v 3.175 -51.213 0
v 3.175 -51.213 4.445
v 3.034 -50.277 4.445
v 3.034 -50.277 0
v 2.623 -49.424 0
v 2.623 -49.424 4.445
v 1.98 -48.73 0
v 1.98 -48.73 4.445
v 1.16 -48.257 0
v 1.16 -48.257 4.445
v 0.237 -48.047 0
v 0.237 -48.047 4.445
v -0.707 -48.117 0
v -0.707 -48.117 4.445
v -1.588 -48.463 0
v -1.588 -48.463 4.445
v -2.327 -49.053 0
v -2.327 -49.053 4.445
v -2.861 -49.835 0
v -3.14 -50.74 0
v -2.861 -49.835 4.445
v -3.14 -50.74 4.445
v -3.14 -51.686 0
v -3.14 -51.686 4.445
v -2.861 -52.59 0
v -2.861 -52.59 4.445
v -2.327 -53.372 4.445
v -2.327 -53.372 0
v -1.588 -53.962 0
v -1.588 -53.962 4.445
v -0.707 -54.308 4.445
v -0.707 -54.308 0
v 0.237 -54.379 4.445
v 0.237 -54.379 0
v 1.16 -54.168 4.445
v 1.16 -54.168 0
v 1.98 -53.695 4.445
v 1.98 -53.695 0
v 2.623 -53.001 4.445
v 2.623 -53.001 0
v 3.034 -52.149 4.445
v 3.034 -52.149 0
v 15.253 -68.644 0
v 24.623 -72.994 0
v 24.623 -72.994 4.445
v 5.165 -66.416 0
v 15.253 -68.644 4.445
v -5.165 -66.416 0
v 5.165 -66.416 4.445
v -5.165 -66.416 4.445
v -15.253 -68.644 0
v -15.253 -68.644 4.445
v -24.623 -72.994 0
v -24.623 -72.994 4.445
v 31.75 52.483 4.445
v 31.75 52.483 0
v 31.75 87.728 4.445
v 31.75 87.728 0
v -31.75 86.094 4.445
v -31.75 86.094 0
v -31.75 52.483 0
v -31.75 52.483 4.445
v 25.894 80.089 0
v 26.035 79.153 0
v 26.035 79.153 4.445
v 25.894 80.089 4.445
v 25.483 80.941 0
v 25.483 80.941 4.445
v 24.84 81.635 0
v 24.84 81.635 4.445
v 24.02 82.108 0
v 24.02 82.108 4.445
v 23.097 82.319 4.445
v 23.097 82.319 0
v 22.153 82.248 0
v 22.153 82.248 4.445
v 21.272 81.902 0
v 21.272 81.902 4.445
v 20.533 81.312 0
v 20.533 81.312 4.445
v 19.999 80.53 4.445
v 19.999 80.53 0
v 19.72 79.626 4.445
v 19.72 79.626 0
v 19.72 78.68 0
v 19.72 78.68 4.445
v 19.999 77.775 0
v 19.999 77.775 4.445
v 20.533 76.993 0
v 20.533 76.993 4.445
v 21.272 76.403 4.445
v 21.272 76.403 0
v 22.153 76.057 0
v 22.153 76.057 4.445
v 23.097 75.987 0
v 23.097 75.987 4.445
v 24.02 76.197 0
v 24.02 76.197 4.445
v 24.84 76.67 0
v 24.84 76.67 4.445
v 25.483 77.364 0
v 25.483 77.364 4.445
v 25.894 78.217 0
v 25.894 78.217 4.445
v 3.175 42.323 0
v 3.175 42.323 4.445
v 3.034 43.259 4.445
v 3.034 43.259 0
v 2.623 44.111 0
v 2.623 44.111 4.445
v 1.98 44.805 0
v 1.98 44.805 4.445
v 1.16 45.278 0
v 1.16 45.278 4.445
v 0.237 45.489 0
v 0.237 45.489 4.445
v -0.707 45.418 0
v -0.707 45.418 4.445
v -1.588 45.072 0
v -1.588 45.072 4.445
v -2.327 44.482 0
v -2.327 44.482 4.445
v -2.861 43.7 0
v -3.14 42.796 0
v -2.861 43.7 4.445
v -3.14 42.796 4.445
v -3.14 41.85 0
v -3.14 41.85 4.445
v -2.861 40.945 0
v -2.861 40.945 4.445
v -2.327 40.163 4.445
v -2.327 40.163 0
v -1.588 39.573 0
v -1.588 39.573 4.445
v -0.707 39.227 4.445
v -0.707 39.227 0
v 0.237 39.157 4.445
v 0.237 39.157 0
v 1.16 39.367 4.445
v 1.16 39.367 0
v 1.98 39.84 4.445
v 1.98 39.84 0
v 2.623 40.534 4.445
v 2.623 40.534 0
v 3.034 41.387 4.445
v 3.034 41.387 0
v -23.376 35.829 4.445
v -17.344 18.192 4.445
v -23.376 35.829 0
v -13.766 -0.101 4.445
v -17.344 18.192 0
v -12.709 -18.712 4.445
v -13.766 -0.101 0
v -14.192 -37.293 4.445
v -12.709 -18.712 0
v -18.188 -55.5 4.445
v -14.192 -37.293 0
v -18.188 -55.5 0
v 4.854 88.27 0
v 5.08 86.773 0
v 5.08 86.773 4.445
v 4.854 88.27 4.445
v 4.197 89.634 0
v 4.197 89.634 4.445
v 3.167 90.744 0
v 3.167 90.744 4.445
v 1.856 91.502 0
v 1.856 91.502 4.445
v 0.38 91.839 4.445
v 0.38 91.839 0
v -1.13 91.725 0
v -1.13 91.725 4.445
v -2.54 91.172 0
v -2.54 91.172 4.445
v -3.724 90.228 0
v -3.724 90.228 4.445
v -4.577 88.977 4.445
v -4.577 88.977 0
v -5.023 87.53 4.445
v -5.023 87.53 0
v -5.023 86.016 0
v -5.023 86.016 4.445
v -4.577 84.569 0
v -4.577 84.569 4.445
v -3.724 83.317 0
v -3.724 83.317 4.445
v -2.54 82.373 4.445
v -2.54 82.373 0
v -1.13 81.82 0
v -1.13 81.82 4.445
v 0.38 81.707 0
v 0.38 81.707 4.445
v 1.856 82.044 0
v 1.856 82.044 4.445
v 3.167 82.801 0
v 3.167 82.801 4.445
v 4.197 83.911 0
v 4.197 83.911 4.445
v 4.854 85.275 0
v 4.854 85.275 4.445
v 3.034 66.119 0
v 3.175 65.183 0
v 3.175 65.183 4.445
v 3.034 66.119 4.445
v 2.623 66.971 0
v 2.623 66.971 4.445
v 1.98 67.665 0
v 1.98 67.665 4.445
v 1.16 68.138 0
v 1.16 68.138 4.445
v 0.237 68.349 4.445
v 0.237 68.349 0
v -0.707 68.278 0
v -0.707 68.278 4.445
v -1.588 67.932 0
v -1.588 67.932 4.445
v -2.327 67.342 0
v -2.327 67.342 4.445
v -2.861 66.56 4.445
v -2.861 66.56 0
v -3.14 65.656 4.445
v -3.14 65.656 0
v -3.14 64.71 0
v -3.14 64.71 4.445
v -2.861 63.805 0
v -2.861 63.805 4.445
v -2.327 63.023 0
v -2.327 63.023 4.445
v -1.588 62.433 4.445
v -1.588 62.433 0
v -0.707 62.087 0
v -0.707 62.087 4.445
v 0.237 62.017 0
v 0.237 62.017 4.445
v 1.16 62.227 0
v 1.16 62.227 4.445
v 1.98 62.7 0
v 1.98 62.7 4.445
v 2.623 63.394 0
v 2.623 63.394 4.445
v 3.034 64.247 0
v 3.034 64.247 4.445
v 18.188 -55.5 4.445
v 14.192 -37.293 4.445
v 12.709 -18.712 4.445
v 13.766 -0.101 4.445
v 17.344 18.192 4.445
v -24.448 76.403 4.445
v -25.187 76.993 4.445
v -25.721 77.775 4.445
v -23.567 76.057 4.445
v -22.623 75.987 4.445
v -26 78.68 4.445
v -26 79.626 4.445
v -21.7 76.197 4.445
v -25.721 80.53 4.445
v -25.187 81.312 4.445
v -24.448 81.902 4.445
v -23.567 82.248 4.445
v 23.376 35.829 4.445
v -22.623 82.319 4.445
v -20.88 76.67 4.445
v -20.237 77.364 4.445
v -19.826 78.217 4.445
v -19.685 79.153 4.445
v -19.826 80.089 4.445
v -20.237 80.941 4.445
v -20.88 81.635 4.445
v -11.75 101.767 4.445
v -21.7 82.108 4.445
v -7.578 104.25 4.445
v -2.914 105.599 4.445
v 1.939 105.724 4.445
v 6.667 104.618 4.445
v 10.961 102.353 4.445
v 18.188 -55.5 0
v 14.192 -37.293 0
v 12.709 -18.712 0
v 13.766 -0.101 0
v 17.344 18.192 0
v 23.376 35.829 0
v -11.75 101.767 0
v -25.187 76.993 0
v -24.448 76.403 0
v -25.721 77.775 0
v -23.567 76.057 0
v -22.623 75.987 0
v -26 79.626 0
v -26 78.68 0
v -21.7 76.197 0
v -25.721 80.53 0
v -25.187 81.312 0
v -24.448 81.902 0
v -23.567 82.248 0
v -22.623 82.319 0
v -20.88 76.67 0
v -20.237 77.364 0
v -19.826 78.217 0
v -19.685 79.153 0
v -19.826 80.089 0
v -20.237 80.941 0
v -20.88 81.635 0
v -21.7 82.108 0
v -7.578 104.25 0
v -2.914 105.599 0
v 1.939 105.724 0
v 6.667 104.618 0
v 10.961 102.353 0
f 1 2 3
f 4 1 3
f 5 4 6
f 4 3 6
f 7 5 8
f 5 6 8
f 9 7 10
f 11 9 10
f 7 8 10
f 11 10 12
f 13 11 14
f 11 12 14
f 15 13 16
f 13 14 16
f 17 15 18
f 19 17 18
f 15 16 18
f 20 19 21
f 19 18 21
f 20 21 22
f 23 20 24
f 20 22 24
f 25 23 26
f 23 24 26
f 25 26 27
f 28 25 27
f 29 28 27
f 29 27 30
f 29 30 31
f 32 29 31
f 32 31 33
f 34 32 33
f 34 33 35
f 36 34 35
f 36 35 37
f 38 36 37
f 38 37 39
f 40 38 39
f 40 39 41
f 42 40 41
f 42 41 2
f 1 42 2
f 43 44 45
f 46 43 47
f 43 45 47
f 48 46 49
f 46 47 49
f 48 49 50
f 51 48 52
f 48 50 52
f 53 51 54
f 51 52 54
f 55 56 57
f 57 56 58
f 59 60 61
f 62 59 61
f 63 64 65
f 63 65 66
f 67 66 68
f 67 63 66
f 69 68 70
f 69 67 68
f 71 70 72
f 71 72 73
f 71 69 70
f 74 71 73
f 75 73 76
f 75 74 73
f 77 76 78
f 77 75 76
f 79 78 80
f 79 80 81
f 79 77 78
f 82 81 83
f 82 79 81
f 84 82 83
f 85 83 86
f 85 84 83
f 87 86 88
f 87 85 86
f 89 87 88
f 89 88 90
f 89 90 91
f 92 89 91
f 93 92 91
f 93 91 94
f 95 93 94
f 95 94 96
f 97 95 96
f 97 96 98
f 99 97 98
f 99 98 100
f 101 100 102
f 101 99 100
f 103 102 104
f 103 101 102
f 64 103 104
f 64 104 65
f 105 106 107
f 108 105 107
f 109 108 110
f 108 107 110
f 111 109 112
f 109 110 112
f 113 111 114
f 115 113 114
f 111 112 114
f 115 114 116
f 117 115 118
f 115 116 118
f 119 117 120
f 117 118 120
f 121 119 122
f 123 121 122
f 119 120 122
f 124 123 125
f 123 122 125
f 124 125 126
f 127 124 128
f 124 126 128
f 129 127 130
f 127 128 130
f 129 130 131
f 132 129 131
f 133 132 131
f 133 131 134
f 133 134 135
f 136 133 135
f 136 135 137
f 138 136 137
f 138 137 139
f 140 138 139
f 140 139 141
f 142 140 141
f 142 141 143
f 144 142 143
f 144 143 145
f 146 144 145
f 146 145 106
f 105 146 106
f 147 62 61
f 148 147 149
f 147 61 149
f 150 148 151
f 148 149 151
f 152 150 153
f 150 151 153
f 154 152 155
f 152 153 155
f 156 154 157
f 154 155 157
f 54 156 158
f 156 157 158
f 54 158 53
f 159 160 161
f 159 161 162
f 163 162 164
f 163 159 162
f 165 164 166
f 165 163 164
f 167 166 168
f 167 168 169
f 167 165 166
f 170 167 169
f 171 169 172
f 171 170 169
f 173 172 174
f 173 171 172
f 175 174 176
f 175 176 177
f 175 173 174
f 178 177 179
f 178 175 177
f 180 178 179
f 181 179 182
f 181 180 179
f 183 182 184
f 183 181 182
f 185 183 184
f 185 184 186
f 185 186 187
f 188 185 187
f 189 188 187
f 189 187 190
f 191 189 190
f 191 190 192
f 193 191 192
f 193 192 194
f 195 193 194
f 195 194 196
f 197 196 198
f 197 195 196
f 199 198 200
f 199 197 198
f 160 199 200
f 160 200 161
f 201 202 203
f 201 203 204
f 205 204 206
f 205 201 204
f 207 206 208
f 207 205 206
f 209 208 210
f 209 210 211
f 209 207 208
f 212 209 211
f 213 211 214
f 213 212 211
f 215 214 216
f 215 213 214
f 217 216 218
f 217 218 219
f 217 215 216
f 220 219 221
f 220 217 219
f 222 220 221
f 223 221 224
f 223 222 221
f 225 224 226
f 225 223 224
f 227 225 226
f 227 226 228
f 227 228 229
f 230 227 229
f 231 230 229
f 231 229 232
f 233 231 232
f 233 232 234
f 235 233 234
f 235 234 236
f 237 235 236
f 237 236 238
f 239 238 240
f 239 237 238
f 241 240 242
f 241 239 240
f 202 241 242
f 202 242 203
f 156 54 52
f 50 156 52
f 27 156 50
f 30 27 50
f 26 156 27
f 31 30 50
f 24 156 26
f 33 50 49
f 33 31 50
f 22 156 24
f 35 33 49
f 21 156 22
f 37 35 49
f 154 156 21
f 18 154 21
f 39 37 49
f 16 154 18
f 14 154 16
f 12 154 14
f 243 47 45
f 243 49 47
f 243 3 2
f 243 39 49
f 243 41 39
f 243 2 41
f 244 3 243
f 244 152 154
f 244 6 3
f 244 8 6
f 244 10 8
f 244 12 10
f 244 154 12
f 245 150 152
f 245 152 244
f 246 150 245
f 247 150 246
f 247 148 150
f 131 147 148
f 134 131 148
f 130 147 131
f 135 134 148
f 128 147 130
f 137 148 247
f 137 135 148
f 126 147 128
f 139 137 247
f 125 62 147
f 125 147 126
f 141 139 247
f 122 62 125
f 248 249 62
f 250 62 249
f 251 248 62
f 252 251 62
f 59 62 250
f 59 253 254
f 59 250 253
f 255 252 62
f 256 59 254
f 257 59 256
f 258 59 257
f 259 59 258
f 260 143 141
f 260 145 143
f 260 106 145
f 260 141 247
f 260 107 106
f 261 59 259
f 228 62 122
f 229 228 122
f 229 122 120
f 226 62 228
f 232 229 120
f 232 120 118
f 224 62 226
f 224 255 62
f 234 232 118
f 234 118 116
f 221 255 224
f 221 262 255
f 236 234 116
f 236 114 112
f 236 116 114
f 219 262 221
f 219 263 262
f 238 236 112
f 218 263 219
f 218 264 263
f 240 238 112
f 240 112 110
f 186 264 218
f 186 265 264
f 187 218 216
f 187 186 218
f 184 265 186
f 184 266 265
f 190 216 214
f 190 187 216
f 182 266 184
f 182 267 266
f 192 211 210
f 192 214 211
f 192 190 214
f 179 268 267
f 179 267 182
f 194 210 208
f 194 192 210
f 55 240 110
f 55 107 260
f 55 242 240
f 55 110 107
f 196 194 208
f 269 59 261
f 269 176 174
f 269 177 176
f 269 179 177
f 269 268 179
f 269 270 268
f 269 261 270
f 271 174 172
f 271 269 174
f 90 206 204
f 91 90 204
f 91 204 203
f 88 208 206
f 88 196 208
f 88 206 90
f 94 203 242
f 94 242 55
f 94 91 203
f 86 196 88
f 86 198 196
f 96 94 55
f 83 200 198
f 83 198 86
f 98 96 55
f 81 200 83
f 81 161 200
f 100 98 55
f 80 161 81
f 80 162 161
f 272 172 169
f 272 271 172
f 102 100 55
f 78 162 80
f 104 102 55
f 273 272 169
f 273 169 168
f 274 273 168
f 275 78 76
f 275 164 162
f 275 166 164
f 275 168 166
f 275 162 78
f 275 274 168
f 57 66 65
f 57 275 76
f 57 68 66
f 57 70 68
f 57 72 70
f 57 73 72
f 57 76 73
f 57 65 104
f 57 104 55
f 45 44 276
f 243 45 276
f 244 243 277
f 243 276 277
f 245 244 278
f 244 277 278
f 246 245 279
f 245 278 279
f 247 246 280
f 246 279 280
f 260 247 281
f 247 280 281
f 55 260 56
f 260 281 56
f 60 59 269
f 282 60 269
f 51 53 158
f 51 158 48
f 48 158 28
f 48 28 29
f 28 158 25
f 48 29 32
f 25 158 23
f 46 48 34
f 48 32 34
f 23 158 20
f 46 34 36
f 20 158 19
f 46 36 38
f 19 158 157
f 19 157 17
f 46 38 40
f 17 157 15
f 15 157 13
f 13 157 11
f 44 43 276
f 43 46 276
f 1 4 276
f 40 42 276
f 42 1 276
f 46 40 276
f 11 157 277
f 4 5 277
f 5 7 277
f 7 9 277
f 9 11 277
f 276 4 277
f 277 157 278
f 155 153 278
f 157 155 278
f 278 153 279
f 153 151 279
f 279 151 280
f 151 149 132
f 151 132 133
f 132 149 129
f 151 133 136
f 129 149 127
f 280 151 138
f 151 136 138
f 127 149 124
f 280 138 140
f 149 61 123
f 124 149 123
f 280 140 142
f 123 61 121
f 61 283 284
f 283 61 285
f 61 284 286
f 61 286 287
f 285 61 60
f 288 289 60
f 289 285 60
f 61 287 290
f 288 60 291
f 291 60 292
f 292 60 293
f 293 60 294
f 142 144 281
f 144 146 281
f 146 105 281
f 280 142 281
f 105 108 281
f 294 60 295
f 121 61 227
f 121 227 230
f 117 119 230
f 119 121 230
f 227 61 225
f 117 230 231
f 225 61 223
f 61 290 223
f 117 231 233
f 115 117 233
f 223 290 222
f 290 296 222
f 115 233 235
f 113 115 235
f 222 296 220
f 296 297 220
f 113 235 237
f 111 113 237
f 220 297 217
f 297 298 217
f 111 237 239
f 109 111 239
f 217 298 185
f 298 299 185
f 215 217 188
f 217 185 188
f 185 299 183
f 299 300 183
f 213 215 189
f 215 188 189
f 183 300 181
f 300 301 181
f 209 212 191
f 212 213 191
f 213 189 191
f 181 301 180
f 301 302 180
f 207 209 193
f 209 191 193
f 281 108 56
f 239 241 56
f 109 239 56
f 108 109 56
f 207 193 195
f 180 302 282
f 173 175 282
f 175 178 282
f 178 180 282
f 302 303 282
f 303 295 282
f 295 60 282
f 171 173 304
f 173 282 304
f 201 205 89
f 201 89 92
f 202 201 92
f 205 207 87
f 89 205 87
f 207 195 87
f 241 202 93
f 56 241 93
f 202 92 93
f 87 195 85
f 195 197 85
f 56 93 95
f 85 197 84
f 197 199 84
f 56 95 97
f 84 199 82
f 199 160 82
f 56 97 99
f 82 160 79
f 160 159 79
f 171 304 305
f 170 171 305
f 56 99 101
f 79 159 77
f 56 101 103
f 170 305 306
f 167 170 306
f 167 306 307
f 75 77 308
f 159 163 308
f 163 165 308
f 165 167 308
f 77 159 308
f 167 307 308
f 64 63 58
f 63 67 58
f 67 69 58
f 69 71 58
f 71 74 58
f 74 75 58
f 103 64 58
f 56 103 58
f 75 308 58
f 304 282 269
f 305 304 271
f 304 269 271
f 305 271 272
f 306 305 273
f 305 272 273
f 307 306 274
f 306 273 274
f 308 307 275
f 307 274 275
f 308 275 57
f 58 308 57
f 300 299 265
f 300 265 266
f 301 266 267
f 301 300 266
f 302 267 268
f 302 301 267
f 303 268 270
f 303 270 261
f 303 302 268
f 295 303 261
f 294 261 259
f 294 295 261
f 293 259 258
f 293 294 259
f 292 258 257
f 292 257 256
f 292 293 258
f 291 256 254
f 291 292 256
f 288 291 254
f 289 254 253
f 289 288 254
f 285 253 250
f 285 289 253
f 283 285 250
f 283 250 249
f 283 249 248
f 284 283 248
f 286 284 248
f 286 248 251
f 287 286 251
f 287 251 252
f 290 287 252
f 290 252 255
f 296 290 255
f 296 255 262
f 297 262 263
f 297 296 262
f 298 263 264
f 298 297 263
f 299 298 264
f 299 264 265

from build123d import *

# Parameters (mm, degrees)
SKETCH2_R           = 6.35
SKETCH2_R_2         = 3.175
SKETCH2_R_3         = 5.08
BOSS_EXTRUDE1_DEPTH = 4.445
SKETCH4_R           = 3.175
CUT_EXTRUDE2_DEPTH  = 148.450257689
SKETCH6_R           = 47.625
CUT_EXTRUDE3_DEPTH  = 148.450257689
CUT_EXTRUDE4_DEPTH  = 117.664246312


with BuildPart() as part:
    # Sketch2 → Boss-Extrude1 (new body)
    with BuildSketch(Plane.XY):
        with BuildLine():
            Line((31.75, 112.17275), (-31.75, 112.17275))
            Line((-31.75, 112.17275), (-31.75, 52.48275))
            ThreePointArc((-31.75, 52.48275), (-12.7, -17.145), (-31.75, -86.77275))
            Line((-31.75, -86.77275), (-31.75, -112.17275))
            ThreePointArc((-31.75, -112.17275), (0, -143.92275), (31.75, -112.17275))
            Line((31.75, -112.17275), (31.75, -86.77275))
            ThreePointArc((31.75, -86.77275), (12.7, -17.145), (31.75, 52.48275))
            Line((31.75, 52.48275), (31.75, 112.17275))
        make_face()
        with Locations((0, -112.17275)):
            Circle(SKETCH2_R, mode=Mode.SUBTRACT)
        with Locations((-22.86, 79.15275)):
            Circle(SKETCH2_R_2, mode=Mode.SUBTRACT)
        with Locations((0, 65.18275)):
            Circle(SKETCH2_R_2, mode=Mode.SUBTRACT)
        with Locations((0, 86.77275)):
            Circle(SKETCH2_R_3, mode=Mode.SUBTRACT)
        with Locations((22.86, 79.15275)):
            Circle(SKETCH2_R_2, mode=Mode.SUBTRACT)
    extrude(amount=BOSS_EXTRUDE1_DEPTH)

    # Sketch4 → Cut-Extrude2 (cut, through all)
    with BuildSketch(Plane.XY.offset(4.445)):
        with Locations((0, 42.32275)):
            Circle(SKETCH4_R)
        with Locations((0, -51.21275)):
            Circle(SKETCH4_R)
    extrude(amount=-CUT_EXTRUDE2_DEPTH, mode=Mode.SUBTRACT)

    # Sketch6 → Cut-Extrude3 (cut, through all)
    with BuildSketch(Plane.XY.offset(4.445)):
        with Locations((0, -113.76025)):
            Circle(SKETCH6_R)
    extrude(amount=-CUT_EXTRUDE3_DEPTH, mode=Mode.SUBTRACT)

    # Sketch10 → Cut-Extrude4 (cut, through all)
    with BuildSketch(Plane.XY.offset(4.445)):
        with BuildLine():
            Line((-31.75, 112.17275), (-31.75, 86.094442115))
            Line((-31.75, 86.094442115), (-11.750340751, 101.767148695))
            ThreePointArc((-11.750340751, 101.767148695), (-0.491450562, 105.816409741), (10.961308866, 102.353257307))
            Line((10.961308866, 102.353257307), (31.75, 87.727850063))
            Line((31.75, 87.727850063), (31.75, 112.17275))
            Line((31.75, 112.17275), (-31.75, 112.17275))
        make_face()
    extrude(amount=-CUT_EXTRUDE4_DEPTH, mode=Mode.SUBTRACT)


solid = part.part
